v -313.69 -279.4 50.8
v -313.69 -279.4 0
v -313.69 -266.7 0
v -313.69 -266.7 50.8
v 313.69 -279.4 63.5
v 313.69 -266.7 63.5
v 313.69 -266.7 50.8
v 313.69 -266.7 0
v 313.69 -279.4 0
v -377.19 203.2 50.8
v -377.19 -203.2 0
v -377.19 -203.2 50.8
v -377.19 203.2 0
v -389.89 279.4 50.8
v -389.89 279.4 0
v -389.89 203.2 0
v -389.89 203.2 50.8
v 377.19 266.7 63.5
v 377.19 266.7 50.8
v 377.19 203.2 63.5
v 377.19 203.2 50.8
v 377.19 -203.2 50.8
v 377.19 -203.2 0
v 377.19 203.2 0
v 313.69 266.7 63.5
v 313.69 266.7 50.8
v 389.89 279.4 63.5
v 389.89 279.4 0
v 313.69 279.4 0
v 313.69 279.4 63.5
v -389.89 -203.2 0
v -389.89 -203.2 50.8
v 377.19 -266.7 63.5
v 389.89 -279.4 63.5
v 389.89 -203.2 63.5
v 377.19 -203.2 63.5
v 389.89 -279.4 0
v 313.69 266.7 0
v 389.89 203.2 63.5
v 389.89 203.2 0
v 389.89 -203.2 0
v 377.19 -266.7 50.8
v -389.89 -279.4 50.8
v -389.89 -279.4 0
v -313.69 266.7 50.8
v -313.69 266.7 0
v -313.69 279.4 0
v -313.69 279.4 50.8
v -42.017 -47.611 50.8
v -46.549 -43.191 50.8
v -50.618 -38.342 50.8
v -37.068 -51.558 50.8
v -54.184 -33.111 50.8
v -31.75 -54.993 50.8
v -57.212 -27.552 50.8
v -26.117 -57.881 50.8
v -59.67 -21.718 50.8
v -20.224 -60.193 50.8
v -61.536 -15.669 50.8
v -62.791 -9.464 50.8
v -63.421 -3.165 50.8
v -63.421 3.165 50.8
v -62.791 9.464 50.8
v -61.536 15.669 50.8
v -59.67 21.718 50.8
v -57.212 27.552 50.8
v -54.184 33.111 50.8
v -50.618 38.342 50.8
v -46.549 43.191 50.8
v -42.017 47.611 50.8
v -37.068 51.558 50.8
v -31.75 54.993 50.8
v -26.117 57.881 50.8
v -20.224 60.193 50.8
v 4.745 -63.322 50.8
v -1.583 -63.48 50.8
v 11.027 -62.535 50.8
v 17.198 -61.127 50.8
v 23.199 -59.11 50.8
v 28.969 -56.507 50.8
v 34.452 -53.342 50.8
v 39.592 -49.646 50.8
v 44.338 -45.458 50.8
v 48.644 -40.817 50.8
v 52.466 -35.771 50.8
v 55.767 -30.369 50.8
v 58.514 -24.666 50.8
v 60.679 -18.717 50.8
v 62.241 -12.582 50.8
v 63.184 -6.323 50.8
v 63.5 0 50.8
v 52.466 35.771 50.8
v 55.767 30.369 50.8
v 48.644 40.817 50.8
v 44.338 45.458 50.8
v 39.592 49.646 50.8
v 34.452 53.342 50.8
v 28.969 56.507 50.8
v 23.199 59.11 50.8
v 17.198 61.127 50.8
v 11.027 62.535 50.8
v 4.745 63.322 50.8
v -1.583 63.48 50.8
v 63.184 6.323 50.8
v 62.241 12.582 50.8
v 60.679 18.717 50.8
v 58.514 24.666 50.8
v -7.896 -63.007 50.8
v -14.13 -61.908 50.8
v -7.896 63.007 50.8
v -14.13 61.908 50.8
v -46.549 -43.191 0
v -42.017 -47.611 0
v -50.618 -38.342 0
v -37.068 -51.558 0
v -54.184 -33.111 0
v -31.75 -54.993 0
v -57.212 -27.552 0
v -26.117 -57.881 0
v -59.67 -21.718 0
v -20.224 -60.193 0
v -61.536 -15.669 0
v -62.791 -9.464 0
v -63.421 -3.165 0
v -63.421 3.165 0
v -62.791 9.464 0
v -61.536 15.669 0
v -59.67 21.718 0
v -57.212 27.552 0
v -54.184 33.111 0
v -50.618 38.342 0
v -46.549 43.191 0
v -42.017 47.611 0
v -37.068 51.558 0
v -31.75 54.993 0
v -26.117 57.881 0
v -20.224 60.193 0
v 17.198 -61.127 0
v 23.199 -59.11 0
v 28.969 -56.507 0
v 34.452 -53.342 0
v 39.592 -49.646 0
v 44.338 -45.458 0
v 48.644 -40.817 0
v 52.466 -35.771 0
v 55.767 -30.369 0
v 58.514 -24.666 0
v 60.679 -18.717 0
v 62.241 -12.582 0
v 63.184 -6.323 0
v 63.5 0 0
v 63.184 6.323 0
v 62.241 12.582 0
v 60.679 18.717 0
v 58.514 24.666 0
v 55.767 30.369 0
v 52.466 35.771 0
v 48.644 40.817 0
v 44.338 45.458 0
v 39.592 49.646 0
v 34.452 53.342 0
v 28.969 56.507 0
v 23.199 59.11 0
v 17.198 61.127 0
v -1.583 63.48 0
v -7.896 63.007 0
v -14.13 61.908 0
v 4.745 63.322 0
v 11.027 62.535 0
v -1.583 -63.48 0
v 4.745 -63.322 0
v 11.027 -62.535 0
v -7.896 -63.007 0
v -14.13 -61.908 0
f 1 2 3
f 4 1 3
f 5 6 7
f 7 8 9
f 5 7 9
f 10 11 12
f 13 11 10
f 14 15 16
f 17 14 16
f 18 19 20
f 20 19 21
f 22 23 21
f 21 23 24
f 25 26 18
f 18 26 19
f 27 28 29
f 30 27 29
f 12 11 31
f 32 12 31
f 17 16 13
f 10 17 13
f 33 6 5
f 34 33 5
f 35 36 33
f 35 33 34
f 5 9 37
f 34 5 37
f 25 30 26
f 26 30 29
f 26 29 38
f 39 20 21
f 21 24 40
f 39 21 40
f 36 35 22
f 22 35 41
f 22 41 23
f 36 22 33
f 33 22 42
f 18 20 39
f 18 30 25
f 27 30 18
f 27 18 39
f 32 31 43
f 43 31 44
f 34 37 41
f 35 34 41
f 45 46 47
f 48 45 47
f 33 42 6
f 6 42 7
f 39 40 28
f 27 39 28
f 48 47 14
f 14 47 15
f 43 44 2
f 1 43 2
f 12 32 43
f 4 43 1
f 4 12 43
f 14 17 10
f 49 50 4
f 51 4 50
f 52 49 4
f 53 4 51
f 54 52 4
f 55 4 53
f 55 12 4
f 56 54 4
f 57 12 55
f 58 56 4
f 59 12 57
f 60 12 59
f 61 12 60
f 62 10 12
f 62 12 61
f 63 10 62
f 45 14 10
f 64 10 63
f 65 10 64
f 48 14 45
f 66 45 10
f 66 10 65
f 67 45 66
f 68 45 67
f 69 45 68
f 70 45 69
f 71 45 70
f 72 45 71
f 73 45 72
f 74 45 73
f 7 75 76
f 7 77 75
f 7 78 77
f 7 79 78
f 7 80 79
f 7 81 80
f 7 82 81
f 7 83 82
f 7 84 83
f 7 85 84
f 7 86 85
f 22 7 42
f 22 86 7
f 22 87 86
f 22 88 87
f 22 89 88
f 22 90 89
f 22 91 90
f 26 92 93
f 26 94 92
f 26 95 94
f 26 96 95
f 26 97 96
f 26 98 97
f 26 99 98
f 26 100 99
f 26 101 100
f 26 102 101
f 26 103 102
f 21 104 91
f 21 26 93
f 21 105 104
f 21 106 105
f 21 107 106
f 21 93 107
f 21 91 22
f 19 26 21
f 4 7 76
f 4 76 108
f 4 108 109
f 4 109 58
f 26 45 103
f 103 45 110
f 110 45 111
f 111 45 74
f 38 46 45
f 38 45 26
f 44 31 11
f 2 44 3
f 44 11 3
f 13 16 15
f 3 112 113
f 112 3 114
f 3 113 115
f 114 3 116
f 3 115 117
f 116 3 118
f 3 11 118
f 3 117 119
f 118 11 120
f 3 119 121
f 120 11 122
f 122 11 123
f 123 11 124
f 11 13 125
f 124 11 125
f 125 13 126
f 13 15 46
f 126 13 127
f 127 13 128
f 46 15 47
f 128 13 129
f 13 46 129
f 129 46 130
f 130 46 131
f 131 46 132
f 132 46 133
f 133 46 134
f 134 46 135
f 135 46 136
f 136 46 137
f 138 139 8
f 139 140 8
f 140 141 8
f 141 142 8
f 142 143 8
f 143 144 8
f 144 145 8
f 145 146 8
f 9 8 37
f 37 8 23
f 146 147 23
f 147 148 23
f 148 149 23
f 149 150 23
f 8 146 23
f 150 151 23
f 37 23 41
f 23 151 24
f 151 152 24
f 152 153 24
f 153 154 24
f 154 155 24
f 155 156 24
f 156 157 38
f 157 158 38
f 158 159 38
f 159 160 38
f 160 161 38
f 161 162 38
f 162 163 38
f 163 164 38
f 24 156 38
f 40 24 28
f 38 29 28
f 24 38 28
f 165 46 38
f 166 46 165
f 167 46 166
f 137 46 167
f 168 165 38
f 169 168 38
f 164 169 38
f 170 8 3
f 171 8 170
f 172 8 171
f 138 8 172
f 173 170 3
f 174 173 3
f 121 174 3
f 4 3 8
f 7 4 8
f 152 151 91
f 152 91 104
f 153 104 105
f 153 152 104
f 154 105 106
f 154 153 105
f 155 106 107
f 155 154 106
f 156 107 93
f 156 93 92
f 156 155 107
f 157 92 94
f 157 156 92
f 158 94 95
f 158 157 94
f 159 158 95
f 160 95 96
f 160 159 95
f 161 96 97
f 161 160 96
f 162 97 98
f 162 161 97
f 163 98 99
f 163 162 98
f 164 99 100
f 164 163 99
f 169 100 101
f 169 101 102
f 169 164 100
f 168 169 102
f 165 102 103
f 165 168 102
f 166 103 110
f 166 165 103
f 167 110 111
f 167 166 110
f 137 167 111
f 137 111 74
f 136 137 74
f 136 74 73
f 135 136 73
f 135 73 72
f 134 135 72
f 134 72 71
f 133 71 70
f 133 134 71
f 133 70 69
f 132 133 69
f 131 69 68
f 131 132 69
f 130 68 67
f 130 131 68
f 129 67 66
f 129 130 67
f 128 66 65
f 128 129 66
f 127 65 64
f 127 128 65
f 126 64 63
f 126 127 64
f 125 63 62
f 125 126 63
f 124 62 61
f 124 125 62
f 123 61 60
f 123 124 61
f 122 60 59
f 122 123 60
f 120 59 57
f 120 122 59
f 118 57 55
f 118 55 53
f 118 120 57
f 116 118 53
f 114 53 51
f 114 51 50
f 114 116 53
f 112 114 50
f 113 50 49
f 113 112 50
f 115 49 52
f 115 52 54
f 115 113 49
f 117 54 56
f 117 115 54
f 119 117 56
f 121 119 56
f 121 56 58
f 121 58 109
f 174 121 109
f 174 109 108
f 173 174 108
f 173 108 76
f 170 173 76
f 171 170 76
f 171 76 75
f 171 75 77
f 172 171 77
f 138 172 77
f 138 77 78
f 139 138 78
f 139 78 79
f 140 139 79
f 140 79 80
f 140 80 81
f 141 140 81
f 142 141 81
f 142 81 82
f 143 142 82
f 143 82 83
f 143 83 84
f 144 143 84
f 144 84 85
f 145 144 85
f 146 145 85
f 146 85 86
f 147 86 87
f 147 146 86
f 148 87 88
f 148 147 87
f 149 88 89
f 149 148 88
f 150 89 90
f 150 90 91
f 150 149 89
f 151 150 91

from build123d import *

# Parameters (mm, degrees)
F0_W     = 754.38
F0_H     = 533.4
F0_R     = 63.5
F2_DEPTH = 50.8
F3_DEPTH = 50.8
F4_DEPTH = 63.5


with BuildPart() as f2:
    # F0 (on Top) → F2 (new body)
    with BuildSketch(Plane.XY):
        Rectangle(F0_W, F0_H)
        Circle(F0_R, mode=Mode.SUBTRACT)
    extrude(amount=F2_DEPTH)

    # F1 (on Top) → F3 (join, through all)
    with BuildSketch(Plane.XY):
        Polygon((-389.89, -279.4), (-313.69, -279.4), (-313.69, -266.7), (-377.19, -266.7), (-377.19, -203.2), (-389.89, -203.2), align=None)
        Polygon((-313.69, 266.7), (-313.69, 279.4), (-389.89, 279.4), (-389.89, 203.2), (-377.19, 203.2), (-377.19, 266.7), align=None)
    extrude(amount=F3_DEPTH)

    # F1 (on Top) → F4 (join)
    with BuildSketch(Plane.XY):
        Polygon((389.89, -203.2), (377.19, -203.2), (377.19, -266.7), (313.69, -266.7), (313.69, -279.4), (389.89, -279.4), align=None)
        Polygon((377.19, 266.7), (377.19, 203.2), (389.89, 203.2), (389.89, 279.4), (313.69, 279.4), (313.69, 266.7), align=None)
    extrude(amount=F4_DEPTH)


solid = f2.part
